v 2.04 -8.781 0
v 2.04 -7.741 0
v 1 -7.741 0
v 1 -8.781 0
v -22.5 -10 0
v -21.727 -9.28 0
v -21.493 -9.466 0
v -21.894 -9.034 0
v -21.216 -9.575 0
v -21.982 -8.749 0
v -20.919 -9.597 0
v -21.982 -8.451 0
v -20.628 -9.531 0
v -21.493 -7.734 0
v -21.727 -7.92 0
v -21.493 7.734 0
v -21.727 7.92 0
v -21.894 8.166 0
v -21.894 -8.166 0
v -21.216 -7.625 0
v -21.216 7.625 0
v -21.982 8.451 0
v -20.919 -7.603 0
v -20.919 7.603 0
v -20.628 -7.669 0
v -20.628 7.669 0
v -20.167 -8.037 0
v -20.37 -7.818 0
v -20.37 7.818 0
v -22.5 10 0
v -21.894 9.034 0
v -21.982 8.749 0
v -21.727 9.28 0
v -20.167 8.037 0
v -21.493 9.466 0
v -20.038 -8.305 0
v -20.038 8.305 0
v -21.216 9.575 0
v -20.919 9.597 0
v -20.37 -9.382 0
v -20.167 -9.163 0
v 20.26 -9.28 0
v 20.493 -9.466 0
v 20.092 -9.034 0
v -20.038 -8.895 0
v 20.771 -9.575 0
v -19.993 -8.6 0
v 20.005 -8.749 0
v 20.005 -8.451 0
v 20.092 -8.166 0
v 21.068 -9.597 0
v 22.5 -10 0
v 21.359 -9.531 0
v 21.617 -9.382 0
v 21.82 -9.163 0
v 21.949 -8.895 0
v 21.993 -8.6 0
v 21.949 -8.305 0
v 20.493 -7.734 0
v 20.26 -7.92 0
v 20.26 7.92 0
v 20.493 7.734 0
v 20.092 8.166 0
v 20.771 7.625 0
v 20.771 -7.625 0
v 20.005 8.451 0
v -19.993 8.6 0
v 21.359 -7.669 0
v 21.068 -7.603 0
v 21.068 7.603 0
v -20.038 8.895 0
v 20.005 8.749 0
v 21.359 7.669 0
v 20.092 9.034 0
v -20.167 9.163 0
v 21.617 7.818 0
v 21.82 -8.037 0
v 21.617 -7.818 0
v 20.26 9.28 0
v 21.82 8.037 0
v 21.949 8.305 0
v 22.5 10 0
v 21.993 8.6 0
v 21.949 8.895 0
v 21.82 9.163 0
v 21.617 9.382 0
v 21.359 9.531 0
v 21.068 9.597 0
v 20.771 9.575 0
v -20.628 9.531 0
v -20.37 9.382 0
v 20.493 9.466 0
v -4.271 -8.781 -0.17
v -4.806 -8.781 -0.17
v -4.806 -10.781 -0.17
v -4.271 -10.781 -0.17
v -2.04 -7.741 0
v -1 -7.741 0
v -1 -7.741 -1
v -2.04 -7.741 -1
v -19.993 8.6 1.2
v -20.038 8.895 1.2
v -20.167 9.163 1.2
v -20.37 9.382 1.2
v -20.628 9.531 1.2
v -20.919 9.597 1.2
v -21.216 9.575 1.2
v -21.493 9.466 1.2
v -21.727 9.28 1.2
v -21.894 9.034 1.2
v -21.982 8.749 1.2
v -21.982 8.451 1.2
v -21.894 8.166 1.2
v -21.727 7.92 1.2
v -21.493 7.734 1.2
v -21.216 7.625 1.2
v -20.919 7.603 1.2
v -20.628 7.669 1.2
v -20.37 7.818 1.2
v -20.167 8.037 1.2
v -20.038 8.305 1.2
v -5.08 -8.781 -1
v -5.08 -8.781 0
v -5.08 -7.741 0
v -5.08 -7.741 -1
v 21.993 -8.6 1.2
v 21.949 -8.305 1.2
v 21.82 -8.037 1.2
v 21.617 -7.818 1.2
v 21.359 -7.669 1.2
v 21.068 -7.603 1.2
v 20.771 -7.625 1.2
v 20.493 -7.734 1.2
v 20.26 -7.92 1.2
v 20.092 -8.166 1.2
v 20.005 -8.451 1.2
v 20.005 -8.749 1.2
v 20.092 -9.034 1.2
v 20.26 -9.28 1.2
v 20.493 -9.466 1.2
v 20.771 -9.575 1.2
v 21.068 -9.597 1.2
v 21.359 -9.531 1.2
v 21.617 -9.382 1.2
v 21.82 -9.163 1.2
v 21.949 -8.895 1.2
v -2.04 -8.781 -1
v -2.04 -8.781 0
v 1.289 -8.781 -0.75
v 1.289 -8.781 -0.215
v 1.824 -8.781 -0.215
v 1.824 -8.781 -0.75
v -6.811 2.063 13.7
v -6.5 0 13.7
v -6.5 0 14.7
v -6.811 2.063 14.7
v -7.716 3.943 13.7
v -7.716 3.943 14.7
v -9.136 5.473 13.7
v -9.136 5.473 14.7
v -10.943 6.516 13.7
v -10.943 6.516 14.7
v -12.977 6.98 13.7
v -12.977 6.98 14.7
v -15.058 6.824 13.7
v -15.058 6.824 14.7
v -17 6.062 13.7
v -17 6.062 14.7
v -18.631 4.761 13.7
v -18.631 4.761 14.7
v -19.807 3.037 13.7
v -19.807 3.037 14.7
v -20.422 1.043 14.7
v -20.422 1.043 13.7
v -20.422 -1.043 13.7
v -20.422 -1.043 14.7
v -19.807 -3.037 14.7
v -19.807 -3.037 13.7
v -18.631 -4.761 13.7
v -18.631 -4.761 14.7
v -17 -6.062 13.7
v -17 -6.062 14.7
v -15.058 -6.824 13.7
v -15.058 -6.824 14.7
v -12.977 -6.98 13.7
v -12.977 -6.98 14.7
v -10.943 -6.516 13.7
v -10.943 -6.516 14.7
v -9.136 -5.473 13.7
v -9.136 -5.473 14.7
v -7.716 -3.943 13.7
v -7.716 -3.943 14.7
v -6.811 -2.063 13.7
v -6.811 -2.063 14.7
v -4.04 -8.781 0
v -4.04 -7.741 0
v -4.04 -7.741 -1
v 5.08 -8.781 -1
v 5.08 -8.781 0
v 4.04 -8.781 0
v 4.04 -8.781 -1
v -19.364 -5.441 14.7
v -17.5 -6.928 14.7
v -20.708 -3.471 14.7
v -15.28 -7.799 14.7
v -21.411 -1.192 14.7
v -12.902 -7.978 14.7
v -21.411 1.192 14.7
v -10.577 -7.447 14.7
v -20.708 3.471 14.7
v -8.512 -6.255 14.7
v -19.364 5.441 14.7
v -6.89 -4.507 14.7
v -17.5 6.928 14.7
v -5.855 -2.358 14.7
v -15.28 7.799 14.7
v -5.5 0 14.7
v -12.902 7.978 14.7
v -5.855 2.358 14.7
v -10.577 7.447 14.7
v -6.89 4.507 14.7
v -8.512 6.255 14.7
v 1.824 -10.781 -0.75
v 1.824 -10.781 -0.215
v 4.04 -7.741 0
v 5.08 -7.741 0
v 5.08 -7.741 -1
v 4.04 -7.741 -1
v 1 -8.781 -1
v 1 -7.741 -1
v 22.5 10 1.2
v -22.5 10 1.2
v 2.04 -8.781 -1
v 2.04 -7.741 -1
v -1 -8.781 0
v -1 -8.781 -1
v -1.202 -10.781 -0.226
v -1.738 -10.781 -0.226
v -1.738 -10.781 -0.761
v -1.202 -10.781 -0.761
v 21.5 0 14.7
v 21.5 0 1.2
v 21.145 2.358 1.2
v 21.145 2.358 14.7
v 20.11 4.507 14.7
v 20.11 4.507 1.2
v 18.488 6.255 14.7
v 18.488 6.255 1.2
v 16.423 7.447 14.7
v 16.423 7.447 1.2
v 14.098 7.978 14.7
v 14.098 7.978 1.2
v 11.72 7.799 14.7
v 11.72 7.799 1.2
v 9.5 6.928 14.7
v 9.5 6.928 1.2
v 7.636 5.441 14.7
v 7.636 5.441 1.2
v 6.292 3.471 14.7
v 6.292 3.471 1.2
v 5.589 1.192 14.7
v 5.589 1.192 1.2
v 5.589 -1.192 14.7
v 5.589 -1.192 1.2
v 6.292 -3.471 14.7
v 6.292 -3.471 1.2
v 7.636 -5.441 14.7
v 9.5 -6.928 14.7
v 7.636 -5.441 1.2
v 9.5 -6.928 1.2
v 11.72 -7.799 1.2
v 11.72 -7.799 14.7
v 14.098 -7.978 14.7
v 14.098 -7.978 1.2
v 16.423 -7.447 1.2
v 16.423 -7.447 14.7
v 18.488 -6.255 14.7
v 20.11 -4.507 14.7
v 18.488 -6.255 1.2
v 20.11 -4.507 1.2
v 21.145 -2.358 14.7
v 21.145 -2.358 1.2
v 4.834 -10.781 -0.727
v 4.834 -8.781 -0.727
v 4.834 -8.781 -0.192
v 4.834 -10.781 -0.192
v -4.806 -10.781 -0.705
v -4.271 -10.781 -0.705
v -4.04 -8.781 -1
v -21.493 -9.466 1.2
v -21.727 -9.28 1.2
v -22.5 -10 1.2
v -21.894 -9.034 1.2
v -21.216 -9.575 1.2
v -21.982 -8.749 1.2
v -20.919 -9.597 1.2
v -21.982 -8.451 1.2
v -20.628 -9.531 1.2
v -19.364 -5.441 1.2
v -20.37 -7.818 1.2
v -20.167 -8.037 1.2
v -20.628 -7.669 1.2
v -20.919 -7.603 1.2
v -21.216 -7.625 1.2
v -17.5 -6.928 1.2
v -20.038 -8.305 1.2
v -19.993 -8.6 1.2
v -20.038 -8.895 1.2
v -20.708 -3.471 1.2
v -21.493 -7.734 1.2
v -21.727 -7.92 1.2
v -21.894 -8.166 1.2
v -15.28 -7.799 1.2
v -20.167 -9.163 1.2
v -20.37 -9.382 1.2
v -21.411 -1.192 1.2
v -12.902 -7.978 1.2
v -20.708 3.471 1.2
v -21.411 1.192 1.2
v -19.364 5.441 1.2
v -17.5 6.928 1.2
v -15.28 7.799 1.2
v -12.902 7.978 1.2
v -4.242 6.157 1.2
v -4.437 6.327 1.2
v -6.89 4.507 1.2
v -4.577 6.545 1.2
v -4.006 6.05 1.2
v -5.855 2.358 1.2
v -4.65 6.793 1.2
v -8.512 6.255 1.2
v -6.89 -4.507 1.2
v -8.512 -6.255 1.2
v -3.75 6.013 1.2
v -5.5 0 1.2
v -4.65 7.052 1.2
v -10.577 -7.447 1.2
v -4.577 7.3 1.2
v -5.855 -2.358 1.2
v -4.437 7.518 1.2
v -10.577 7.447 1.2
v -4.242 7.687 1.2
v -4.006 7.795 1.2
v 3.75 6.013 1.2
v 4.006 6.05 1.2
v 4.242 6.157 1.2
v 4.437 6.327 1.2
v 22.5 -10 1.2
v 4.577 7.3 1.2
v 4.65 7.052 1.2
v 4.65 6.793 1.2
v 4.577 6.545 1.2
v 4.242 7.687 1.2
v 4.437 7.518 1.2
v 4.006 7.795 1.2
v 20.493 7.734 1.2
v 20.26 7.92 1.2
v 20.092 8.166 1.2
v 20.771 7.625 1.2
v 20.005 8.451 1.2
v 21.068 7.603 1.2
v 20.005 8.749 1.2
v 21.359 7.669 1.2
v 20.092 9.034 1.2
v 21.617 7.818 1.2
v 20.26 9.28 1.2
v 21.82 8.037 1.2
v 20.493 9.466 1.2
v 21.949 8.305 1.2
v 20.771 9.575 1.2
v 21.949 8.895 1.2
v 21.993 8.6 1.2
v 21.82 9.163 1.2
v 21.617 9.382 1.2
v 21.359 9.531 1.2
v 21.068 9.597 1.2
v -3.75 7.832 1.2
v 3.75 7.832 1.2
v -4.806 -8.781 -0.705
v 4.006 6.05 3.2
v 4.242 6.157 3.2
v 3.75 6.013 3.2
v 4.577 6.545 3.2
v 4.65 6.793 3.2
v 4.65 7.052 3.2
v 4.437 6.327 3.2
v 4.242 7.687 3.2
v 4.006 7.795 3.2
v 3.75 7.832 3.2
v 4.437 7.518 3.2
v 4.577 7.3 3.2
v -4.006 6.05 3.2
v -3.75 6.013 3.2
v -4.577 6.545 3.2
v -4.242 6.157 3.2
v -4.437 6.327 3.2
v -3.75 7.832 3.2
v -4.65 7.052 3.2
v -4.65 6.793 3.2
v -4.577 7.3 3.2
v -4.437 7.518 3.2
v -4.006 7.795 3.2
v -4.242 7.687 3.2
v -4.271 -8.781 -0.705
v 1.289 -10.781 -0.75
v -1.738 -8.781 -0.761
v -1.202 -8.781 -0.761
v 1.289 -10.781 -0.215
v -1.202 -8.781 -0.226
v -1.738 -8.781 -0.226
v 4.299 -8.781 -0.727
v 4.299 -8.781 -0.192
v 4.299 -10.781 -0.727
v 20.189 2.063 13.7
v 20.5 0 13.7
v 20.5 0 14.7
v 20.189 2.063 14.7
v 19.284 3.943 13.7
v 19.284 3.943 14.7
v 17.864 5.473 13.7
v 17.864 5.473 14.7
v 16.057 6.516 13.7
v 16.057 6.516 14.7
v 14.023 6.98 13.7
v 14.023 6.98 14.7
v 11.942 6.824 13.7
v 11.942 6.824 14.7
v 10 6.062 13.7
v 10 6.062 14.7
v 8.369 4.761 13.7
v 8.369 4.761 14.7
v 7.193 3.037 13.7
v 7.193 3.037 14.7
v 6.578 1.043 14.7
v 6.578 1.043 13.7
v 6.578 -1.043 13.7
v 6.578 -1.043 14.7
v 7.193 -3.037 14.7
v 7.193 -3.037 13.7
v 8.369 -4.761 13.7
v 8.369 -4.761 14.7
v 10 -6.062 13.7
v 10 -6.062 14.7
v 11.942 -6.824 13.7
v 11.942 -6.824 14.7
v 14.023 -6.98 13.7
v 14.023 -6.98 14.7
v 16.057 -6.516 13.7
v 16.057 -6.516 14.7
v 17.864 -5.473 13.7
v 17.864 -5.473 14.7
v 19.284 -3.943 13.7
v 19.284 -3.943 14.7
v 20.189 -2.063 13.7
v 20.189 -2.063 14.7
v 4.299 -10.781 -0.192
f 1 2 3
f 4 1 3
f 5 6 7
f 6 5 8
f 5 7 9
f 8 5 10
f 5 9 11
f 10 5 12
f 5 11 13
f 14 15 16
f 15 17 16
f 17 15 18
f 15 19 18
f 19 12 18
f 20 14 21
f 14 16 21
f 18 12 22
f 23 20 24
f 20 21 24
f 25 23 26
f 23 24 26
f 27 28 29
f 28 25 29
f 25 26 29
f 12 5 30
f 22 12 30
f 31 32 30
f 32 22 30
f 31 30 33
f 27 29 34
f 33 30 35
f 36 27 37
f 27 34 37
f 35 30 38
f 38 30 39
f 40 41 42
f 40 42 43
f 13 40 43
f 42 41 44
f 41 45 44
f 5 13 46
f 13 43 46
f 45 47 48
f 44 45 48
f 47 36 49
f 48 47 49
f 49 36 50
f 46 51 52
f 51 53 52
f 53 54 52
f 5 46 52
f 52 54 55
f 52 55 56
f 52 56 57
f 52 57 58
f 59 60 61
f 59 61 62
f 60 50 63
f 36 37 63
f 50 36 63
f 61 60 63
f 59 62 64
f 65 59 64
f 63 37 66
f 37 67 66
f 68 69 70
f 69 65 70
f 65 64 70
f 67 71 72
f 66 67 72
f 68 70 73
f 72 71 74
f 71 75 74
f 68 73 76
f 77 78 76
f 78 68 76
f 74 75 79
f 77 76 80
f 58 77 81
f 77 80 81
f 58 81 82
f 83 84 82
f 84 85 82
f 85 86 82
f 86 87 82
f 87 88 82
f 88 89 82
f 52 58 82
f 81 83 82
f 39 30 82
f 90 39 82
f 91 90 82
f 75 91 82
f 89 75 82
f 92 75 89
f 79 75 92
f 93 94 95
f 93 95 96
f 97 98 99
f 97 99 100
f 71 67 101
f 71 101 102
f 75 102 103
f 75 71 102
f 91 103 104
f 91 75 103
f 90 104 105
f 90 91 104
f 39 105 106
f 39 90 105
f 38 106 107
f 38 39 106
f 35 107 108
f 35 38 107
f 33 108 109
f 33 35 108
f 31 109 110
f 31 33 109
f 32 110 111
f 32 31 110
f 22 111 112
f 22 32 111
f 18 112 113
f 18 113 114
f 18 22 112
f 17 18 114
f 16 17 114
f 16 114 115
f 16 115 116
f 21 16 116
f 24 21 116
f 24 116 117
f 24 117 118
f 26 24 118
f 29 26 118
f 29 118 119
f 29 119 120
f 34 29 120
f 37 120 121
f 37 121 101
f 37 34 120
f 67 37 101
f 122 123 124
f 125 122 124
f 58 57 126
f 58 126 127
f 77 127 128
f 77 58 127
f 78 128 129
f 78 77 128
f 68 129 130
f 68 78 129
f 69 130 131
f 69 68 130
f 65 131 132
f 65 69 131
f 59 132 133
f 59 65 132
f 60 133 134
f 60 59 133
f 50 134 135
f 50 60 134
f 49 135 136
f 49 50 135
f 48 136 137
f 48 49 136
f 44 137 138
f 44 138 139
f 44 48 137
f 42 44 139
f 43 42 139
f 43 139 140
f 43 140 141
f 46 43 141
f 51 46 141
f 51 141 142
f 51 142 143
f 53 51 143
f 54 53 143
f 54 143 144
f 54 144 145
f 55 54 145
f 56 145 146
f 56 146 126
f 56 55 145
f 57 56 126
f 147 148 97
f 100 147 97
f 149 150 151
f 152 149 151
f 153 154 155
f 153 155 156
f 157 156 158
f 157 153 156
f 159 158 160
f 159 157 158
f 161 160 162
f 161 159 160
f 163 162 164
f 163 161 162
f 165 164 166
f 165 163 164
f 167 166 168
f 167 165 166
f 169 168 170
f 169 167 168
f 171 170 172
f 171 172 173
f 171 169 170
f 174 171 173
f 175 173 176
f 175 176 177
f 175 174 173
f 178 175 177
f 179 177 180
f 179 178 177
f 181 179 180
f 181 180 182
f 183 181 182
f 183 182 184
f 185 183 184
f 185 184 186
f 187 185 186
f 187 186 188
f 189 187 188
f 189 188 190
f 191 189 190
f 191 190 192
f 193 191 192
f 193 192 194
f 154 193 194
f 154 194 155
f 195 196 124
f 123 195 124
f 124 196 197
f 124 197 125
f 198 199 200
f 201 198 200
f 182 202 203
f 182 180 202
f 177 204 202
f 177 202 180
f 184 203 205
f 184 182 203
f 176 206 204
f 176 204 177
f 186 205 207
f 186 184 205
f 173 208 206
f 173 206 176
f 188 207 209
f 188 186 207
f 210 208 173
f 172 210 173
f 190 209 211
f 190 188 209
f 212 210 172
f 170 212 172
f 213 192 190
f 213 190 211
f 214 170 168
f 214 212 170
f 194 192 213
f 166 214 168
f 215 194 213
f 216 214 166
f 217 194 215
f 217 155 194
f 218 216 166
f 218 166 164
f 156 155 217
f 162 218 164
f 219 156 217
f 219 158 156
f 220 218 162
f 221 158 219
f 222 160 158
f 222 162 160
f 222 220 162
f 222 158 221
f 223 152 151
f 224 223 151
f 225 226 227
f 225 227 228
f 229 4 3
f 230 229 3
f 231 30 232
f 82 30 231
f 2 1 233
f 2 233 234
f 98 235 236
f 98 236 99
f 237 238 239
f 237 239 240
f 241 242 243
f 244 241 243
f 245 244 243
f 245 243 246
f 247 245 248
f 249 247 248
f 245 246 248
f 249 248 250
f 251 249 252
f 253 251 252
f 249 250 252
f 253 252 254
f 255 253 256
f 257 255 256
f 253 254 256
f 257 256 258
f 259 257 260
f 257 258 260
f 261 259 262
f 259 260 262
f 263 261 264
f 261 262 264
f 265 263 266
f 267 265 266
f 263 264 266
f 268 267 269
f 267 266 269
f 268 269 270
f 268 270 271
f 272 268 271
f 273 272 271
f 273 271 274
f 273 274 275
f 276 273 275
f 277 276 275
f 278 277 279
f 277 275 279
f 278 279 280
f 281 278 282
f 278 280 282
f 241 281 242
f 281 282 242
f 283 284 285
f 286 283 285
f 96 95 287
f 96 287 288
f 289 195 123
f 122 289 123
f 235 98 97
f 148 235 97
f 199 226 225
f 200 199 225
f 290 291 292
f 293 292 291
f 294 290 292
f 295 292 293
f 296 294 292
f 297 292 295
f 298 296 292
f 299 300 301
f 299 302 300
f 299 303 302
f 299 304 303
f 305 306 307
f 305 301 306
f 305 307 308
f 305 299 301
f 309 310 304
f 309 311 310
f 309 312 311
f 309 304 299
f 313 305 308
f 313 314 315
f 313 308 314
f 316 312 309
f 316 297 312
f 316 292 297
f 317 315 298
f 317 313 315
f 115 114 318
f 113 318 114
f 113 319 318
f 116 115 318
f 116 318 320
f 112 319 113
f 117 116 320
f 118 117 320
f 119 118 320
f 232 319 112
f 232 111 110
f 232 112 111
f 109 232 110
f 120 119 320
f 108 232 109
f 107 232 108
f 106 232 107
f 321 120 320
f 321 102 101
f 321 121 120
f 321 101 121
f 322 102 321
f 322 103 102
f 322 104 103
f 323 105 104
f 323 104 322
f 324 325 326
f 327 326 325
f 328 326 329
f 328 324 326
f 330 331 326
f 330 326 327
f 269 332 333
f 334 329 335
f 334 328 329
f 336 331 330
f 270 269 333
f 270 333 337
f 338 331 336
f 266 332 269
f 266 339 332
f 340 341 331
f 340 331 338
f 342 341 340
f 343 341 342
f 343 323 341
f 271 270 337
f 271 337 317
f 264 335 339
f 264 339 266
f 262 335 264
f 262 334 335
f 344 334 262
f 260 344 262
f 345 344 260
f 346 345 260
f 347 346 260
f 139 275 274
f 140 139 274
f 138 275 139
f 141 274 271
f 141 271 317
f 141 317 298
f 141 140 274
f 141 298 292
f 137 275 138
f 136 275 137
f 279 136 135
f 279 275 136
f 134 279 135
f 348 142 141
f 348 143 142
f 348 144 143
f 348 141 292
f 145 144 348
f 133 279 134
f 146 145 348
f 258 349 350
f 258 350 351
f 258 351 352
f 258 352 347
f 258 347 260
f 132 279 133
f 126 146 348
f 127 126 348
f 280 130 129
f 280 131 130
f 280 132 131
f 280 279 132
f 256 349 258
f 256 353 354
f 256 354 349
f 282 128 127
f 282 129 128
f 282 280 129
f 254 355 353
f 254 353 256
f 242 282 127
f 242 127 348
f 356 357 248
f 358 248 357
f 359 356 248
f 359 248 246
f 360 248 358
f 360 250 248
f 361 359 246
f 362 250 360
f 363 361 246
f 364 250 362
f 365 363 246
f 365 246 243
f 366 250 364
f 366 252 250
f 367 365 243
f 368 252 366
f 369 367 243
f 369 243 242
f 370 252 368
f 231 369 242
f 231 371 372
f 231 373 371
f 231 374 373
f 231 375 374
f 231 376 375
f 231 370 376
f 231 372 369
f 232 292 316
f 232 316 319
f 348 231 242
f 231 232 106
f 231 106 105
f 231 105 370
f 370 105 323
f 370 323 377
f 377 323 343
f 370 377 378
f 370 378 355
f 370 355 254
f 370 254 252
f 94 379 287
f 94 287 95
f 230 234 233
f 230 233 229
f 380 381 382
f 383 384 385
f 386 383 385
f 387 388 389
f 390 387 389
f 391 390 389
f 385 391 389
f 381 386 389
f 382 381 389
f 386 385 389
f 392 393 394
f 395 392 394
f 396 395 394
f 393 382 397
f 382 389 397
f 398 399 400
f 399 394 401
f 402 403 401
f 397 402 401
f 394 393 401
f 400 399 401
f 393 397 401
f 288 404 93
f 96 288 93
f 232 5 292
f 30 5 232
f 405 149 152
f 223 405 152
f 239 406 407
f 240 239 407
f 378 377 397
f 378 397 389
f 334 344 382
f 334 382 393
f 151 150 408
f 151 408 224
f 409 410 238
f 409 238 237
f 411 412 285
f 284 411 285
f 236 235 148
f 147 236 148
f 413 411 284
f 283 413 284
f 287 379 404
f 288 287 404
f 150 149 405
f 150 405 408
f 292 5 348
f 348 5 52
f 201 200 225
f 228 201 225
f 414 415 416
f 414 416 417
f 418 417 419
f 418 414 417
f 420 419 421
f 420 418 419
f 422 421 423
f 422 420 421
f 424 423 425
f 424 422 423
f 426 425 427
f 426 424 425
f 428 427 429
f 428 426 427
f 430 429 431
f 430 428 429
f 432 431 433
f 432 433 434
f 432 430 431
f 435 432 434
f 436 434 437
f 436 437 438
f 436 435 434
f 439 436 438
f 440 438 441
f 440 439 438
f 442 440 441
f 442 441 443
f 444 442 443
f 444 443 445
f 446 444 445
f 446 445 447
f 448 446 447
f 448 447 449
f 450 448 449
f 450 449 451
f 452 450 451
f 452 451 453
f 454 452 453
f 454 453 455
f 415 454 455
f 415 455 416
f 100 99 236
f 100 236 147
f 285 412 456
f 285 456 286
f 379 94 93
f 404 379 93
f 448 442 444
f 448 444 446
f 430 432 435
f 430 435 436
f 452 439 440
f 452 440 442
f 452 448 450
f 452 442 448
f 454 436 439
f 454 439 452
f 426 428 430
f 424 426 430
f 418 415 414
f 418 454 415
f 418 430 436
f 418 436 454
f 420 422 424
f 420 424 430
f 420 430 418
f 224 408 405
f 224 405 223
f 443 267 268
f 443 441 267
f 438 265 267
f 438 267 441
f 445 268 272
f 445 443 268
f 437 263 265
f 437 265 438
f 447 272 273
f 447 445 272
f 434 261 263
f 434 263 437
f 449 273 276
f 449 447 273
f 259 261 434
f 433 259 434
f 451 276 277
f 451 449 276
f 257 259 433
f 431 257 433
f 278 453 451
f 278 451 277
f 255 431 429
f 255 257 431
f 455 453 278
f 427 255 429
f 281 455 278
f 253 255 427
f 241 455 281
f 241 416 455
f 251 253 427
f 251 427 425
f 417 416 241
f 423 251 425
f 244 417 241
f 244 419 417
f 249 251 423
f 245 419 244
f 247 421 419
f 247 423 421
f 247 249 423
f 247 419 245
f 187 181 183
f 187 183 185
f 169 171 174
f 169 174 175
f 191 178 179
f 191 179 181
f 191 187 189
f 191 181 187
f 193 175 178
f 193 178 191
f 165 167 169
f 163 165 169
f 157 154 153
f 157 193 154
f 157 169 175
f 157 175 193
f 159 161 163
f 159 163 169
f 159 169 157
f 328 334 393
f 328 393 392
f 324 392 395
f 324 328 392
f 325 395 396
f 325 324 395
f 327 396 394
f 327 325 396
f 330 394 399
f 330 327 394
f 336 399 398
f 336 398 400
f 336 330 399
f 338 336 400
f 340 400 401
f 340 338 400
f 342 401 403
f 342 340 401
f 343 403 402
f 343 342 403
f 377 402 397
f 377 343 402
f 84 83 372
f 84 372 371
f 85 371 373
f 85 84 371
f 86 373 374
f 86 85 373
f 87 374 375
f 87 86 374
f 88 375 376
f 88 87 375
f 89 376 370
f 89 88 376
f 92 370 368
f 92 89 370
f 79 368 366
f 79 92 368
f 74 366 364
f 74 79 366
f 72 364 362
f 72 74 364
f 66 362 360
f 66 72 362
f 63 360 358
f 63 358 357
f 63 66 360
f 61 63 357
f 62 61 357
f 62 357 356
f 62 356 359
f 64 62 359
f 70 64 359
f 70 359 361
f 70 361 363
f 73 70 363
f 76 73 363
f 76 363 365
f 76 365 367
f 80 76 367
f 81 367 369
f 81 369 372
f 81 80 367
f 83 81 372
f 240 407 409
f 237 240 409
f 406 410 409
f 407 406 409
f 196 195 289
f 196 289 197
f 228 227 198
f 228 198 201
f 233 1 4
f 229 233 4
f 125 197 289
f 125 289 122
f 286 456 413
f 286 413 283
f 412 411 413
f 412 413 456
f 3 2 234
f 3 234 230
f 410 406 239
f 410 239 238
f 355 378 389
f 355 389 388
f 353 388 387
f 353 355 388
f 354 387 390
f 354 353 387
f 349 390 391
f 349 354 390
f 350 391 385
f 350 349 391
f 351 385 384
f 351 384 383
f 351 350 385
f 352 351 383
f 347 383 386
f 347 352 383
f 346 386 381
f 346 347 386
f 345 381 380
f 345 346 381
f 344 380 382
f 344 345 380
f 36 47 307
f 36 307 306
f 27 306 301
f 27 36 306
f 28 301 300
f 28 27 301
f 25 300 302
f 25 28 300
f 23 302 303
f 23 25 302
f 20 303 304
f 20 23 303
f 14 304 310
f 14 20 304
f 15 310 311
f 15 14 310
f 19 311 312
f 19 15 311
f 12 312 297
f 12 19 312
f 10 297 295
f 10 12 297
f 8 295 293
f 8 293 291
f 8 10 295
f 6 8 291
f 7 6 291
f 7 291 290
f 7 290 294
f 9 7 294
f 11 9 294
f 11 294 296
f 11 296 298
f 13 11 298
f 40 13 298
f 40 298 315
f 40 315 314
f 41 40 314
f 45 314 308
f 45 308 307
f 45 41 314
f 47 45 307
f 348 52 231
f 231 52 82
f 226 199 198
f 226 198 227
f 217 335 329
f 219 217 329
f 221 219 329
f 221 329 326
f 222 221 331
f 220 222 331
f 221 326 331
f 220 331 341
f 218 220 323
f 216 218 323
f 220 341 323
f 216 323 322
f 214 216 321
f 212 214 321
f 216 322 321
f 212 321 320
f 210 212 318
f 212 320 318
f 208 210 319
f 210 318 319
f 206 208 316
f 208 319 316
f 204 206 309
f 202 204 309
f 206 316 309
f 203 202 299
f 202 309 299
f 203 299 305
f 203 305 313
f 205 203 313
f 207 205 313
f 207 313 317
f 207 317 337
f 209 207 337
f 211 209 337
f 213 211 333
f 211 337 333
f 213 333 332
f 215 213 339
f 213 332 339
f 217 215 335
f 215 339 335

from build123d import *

# Parameters (mm, degrees)
SKETCH1_W             = 45
SKETCH1_H             = 20
SKETCH1_R             = 1
BOSS_EXTRUDE3_DEPTH   = 1.2
SKETCH5_R             = 8
SKETCH5_R_2           = 7
EXTRUDE_THIN1_DEPTH   = 13.5
EXTRUDE_THIN1_2_DEPTH = 13.5
BOSS_EXTRUDE4_DEPTH   = 2
SKETCH11_R            = 7
BOSS_EXTRUDE5_DEPTH   = 12.5
SKETCH12_W            = 1.04
SKETCH12_H            = 1.04
BOSS_EXTRUDE6_DEPTH   = 1
BOSS_EXTRUDE6_2_DEPTH = 1
BOSS_EXTRUDE6_3_DEPTH = 1
BOSS_EXTRUDE6_4_DEPTH = 1
SKETCH16_W            = 0.53517923
SKETCH16_H            = 0.53517923
BOSS_EXTRUDE7_DEPTH   = 2
SKETCH16_H_2          = 0.535179229
BOSS_EXTRUDE7_2_DEPTH = 2
SKETCH16_W_2          = 0.535179229
BOSS_EXTRUDE7_3_DEPTH = 2
BOSS_EXTRUDE7_4_DEPTH = 2


with BuildPart() as part:
    # Sketch1 → Boss-Extrude3 (new body)
    with BuildSketch(Plane.XY):
        Rectangle(SKETCH1_W, SKETCH1_H)
        with Locations((-20.993468664, 8.6)):
            Circle(SKETCH1_R, mode=Mode.SUBTRACT)
        with Locations((-20.993468664, -8.6)):
            Circle(SKETCH1_R, mode=Mode.SUBTRACT)
        with Locations((20.993468664, -8.6)):
            Circle(SKETCH1_R, mode=Mode.SUBTRACT)
        with Locations((20.993468664, 8.6)):
            Circle(SKETCH1_R, mode=Mode.SUBTRACT)
    extrude(amount=BOSS_EXTRUDE3_DEPTH)

    # Sketch8 → Boss-Extrude4 (add)
    with BuildSketch(Plane.XY.offset(1.2)):
        with BuildLine():
            Line((-3.75, 7.831608298), (3.75, 7.831608298))
            ThreePointArc((3.75, 7.831608298), (4.659242449, 6.922365849), (3.75, 6.013123399))
            Line((3.75, 6.013123399), (-3.75, 6.013123399))
            ThreePointArc((-3.75, 6.013123399), (-4.659242449, 6.922365849), (-3.75, 7.831608298))
        make_face()
    extrude(amount=BOSS_EXTRUDE4_DEPTH)



with BuildPart() as body_2:
    # Sketch5 → Extrude-Thin1 (new body)
    with BuildSketch(Plane.XY.offset(1.2)):
        with Locations((-13.5, 0)):
            Circle(SKETCH5_R)
        with Locations((-13.5, 0)):
            Circle(SKETCH5_R_2, mode=Mode.SUBTRACT)
    extrude(amount=EXTRUDE_THIN1_DEPTH)


with BuildPart() as body_3:
    # Sketch5 → Extrude-Thin1 2 (new body)
    with BuildSketch(Plane.XY.offset(1.2)):
        with Locations((13.5, 0)):
            Circle(SKETCH5_R)
        with Locations((13.5, 0)):
            Circle(SKETCH5_R_2, mode=Mode.SUBTRACT)
    extrude(amount=EXTRUDE_THIN1_2_DEPTH)


with BuildPart() as part_1:
    add(part.part)

    add(body_2.part)  # Boss-Extrude5 merges body 2

    add(body_3.part)  # Boss-Extrude5 merges body 3
    # Sketch11 → Boss-Extrude5 (add)
    with BuildSketch(Plane.XY.offset(1.2)):
        with Locations((-13.5, 0)):
            Circle(SKETCH11_R)
        with Locations((13.5, 0)):
            Circle(SKETCH11_R)
    extrude(amount=BOSS_EXTRUDE5_DEPTH)


with BuildPart() as body_2_2:
    # Sketch12 → Boss-Extrude6 (new body)
    with BuildSketch(Plane(origin=(0, 0, 0), x_dir=(-1, 0, 0), z_dir=(0, 0, -1))):
        with Locations((1.52, -8.260870843)):
            Rectangle(SKETCH12_W, SKETCH12_H)
    extrude(amount=BOSS_EXTRUDE6_DEPTH)


with BuildPart() as body_3_2:
    # Sketch12 → Boss-Extrude6 2 (new body)
    with BuildSketch(Plane(origin=(0, 0, 0), x_dir=(-1, 0, 0), z_dir=(0, 0, -1))):
        with Locations((-1.52, -8.260870843)):
            Rectangle(SKETCH12_W, SKETCH12_H)
    extrude(amount=BOSS_EXTRUDE6_2_DEPTH)


with BuildPart() as body_4:
    # Sketch12 → Boss-Extrude6 3 (new body)
    with BuildSketch(Plane(origin=(0, 0, 0), x_dir=(-1, 0, 0), z_dir=(0, 0, -1))):
        with Locations((-4.56, -8.260870843)):
            Rectangle(SKETCH12_W, SKETCH12_H)
    extrude(amount=BOSS_EXTRUDE6_3_DEPTH)


with BuildPart() as body_5:
    # Sketch12 → Boss-Extrude6 4 (new body)
    with BuildSketch(Plane(origin=(0, 0, 0), x_dir=(-1, 0, 0), z_dir=(0, 0, -1))):
        with Locations((4.56, -8.260870843)):
            Rectangle(SKETCH12_W, SKETCH12_H)
    extrude(amount=BOSS_EXTRUDE6_4_DEPTH)


with BuildPart() as body_6:
    # Sketch16 → Boss-Extrude7 (new body)
    with BuildSketch(Plane.XZ.offset(8.780870843)):
        with Locations((-4.538269148, -0.437455606)):
            Rectangle(SKETCH16_W, SKETCH16_H)
    extrude(amount=BOSS_EXTRUDE7_DEPTH)


with BuildPart() as body_7:
    # Sketch16 → Boss-Extrude7 2 (new body)
    with BuildSketch(Plane.XZ.offset(8.780870843)):
        with Locations((-1.470019189, -0.493301318)):
            Rectangle(SKETCH16_W, SKETCH16_H_2)
    extrude(amount=BOSS_EXTRUDE7_2_DEPTH)


with BuildPart() as body_8:
    # Sketch16 → Boss-Extrude7 3 (new body)
    with BuildSketch(Plane.XZ.offset(8.780870843)):
        with Locations((1.556715092, -0.482132175)):
            Rectangle(SKETCH16_W_2, SKETCH16_H)
    extrude(amount=BOSS_EXTRUDE7_3_DEPTH)


with BuildPart() as body_9:
    # Sketch16 → Boss-Extrude7 4 (new body)
    with BuildSketch(Plane.XZ.offset(8.780870843)):
        with Locations((4.566401051, -0.459793891)):
            Rectangle(SKETCH16_W, SKETCH16_H)
    extrude(amount=BOSS_EXTRUDE7_4_DEPTH)


solid = Compound([part_1.part, body_2_2.part, body_3_2.part, body_4.part, body_5.part, body_6.part, body_7.part, body_8.part, body_9.part])
